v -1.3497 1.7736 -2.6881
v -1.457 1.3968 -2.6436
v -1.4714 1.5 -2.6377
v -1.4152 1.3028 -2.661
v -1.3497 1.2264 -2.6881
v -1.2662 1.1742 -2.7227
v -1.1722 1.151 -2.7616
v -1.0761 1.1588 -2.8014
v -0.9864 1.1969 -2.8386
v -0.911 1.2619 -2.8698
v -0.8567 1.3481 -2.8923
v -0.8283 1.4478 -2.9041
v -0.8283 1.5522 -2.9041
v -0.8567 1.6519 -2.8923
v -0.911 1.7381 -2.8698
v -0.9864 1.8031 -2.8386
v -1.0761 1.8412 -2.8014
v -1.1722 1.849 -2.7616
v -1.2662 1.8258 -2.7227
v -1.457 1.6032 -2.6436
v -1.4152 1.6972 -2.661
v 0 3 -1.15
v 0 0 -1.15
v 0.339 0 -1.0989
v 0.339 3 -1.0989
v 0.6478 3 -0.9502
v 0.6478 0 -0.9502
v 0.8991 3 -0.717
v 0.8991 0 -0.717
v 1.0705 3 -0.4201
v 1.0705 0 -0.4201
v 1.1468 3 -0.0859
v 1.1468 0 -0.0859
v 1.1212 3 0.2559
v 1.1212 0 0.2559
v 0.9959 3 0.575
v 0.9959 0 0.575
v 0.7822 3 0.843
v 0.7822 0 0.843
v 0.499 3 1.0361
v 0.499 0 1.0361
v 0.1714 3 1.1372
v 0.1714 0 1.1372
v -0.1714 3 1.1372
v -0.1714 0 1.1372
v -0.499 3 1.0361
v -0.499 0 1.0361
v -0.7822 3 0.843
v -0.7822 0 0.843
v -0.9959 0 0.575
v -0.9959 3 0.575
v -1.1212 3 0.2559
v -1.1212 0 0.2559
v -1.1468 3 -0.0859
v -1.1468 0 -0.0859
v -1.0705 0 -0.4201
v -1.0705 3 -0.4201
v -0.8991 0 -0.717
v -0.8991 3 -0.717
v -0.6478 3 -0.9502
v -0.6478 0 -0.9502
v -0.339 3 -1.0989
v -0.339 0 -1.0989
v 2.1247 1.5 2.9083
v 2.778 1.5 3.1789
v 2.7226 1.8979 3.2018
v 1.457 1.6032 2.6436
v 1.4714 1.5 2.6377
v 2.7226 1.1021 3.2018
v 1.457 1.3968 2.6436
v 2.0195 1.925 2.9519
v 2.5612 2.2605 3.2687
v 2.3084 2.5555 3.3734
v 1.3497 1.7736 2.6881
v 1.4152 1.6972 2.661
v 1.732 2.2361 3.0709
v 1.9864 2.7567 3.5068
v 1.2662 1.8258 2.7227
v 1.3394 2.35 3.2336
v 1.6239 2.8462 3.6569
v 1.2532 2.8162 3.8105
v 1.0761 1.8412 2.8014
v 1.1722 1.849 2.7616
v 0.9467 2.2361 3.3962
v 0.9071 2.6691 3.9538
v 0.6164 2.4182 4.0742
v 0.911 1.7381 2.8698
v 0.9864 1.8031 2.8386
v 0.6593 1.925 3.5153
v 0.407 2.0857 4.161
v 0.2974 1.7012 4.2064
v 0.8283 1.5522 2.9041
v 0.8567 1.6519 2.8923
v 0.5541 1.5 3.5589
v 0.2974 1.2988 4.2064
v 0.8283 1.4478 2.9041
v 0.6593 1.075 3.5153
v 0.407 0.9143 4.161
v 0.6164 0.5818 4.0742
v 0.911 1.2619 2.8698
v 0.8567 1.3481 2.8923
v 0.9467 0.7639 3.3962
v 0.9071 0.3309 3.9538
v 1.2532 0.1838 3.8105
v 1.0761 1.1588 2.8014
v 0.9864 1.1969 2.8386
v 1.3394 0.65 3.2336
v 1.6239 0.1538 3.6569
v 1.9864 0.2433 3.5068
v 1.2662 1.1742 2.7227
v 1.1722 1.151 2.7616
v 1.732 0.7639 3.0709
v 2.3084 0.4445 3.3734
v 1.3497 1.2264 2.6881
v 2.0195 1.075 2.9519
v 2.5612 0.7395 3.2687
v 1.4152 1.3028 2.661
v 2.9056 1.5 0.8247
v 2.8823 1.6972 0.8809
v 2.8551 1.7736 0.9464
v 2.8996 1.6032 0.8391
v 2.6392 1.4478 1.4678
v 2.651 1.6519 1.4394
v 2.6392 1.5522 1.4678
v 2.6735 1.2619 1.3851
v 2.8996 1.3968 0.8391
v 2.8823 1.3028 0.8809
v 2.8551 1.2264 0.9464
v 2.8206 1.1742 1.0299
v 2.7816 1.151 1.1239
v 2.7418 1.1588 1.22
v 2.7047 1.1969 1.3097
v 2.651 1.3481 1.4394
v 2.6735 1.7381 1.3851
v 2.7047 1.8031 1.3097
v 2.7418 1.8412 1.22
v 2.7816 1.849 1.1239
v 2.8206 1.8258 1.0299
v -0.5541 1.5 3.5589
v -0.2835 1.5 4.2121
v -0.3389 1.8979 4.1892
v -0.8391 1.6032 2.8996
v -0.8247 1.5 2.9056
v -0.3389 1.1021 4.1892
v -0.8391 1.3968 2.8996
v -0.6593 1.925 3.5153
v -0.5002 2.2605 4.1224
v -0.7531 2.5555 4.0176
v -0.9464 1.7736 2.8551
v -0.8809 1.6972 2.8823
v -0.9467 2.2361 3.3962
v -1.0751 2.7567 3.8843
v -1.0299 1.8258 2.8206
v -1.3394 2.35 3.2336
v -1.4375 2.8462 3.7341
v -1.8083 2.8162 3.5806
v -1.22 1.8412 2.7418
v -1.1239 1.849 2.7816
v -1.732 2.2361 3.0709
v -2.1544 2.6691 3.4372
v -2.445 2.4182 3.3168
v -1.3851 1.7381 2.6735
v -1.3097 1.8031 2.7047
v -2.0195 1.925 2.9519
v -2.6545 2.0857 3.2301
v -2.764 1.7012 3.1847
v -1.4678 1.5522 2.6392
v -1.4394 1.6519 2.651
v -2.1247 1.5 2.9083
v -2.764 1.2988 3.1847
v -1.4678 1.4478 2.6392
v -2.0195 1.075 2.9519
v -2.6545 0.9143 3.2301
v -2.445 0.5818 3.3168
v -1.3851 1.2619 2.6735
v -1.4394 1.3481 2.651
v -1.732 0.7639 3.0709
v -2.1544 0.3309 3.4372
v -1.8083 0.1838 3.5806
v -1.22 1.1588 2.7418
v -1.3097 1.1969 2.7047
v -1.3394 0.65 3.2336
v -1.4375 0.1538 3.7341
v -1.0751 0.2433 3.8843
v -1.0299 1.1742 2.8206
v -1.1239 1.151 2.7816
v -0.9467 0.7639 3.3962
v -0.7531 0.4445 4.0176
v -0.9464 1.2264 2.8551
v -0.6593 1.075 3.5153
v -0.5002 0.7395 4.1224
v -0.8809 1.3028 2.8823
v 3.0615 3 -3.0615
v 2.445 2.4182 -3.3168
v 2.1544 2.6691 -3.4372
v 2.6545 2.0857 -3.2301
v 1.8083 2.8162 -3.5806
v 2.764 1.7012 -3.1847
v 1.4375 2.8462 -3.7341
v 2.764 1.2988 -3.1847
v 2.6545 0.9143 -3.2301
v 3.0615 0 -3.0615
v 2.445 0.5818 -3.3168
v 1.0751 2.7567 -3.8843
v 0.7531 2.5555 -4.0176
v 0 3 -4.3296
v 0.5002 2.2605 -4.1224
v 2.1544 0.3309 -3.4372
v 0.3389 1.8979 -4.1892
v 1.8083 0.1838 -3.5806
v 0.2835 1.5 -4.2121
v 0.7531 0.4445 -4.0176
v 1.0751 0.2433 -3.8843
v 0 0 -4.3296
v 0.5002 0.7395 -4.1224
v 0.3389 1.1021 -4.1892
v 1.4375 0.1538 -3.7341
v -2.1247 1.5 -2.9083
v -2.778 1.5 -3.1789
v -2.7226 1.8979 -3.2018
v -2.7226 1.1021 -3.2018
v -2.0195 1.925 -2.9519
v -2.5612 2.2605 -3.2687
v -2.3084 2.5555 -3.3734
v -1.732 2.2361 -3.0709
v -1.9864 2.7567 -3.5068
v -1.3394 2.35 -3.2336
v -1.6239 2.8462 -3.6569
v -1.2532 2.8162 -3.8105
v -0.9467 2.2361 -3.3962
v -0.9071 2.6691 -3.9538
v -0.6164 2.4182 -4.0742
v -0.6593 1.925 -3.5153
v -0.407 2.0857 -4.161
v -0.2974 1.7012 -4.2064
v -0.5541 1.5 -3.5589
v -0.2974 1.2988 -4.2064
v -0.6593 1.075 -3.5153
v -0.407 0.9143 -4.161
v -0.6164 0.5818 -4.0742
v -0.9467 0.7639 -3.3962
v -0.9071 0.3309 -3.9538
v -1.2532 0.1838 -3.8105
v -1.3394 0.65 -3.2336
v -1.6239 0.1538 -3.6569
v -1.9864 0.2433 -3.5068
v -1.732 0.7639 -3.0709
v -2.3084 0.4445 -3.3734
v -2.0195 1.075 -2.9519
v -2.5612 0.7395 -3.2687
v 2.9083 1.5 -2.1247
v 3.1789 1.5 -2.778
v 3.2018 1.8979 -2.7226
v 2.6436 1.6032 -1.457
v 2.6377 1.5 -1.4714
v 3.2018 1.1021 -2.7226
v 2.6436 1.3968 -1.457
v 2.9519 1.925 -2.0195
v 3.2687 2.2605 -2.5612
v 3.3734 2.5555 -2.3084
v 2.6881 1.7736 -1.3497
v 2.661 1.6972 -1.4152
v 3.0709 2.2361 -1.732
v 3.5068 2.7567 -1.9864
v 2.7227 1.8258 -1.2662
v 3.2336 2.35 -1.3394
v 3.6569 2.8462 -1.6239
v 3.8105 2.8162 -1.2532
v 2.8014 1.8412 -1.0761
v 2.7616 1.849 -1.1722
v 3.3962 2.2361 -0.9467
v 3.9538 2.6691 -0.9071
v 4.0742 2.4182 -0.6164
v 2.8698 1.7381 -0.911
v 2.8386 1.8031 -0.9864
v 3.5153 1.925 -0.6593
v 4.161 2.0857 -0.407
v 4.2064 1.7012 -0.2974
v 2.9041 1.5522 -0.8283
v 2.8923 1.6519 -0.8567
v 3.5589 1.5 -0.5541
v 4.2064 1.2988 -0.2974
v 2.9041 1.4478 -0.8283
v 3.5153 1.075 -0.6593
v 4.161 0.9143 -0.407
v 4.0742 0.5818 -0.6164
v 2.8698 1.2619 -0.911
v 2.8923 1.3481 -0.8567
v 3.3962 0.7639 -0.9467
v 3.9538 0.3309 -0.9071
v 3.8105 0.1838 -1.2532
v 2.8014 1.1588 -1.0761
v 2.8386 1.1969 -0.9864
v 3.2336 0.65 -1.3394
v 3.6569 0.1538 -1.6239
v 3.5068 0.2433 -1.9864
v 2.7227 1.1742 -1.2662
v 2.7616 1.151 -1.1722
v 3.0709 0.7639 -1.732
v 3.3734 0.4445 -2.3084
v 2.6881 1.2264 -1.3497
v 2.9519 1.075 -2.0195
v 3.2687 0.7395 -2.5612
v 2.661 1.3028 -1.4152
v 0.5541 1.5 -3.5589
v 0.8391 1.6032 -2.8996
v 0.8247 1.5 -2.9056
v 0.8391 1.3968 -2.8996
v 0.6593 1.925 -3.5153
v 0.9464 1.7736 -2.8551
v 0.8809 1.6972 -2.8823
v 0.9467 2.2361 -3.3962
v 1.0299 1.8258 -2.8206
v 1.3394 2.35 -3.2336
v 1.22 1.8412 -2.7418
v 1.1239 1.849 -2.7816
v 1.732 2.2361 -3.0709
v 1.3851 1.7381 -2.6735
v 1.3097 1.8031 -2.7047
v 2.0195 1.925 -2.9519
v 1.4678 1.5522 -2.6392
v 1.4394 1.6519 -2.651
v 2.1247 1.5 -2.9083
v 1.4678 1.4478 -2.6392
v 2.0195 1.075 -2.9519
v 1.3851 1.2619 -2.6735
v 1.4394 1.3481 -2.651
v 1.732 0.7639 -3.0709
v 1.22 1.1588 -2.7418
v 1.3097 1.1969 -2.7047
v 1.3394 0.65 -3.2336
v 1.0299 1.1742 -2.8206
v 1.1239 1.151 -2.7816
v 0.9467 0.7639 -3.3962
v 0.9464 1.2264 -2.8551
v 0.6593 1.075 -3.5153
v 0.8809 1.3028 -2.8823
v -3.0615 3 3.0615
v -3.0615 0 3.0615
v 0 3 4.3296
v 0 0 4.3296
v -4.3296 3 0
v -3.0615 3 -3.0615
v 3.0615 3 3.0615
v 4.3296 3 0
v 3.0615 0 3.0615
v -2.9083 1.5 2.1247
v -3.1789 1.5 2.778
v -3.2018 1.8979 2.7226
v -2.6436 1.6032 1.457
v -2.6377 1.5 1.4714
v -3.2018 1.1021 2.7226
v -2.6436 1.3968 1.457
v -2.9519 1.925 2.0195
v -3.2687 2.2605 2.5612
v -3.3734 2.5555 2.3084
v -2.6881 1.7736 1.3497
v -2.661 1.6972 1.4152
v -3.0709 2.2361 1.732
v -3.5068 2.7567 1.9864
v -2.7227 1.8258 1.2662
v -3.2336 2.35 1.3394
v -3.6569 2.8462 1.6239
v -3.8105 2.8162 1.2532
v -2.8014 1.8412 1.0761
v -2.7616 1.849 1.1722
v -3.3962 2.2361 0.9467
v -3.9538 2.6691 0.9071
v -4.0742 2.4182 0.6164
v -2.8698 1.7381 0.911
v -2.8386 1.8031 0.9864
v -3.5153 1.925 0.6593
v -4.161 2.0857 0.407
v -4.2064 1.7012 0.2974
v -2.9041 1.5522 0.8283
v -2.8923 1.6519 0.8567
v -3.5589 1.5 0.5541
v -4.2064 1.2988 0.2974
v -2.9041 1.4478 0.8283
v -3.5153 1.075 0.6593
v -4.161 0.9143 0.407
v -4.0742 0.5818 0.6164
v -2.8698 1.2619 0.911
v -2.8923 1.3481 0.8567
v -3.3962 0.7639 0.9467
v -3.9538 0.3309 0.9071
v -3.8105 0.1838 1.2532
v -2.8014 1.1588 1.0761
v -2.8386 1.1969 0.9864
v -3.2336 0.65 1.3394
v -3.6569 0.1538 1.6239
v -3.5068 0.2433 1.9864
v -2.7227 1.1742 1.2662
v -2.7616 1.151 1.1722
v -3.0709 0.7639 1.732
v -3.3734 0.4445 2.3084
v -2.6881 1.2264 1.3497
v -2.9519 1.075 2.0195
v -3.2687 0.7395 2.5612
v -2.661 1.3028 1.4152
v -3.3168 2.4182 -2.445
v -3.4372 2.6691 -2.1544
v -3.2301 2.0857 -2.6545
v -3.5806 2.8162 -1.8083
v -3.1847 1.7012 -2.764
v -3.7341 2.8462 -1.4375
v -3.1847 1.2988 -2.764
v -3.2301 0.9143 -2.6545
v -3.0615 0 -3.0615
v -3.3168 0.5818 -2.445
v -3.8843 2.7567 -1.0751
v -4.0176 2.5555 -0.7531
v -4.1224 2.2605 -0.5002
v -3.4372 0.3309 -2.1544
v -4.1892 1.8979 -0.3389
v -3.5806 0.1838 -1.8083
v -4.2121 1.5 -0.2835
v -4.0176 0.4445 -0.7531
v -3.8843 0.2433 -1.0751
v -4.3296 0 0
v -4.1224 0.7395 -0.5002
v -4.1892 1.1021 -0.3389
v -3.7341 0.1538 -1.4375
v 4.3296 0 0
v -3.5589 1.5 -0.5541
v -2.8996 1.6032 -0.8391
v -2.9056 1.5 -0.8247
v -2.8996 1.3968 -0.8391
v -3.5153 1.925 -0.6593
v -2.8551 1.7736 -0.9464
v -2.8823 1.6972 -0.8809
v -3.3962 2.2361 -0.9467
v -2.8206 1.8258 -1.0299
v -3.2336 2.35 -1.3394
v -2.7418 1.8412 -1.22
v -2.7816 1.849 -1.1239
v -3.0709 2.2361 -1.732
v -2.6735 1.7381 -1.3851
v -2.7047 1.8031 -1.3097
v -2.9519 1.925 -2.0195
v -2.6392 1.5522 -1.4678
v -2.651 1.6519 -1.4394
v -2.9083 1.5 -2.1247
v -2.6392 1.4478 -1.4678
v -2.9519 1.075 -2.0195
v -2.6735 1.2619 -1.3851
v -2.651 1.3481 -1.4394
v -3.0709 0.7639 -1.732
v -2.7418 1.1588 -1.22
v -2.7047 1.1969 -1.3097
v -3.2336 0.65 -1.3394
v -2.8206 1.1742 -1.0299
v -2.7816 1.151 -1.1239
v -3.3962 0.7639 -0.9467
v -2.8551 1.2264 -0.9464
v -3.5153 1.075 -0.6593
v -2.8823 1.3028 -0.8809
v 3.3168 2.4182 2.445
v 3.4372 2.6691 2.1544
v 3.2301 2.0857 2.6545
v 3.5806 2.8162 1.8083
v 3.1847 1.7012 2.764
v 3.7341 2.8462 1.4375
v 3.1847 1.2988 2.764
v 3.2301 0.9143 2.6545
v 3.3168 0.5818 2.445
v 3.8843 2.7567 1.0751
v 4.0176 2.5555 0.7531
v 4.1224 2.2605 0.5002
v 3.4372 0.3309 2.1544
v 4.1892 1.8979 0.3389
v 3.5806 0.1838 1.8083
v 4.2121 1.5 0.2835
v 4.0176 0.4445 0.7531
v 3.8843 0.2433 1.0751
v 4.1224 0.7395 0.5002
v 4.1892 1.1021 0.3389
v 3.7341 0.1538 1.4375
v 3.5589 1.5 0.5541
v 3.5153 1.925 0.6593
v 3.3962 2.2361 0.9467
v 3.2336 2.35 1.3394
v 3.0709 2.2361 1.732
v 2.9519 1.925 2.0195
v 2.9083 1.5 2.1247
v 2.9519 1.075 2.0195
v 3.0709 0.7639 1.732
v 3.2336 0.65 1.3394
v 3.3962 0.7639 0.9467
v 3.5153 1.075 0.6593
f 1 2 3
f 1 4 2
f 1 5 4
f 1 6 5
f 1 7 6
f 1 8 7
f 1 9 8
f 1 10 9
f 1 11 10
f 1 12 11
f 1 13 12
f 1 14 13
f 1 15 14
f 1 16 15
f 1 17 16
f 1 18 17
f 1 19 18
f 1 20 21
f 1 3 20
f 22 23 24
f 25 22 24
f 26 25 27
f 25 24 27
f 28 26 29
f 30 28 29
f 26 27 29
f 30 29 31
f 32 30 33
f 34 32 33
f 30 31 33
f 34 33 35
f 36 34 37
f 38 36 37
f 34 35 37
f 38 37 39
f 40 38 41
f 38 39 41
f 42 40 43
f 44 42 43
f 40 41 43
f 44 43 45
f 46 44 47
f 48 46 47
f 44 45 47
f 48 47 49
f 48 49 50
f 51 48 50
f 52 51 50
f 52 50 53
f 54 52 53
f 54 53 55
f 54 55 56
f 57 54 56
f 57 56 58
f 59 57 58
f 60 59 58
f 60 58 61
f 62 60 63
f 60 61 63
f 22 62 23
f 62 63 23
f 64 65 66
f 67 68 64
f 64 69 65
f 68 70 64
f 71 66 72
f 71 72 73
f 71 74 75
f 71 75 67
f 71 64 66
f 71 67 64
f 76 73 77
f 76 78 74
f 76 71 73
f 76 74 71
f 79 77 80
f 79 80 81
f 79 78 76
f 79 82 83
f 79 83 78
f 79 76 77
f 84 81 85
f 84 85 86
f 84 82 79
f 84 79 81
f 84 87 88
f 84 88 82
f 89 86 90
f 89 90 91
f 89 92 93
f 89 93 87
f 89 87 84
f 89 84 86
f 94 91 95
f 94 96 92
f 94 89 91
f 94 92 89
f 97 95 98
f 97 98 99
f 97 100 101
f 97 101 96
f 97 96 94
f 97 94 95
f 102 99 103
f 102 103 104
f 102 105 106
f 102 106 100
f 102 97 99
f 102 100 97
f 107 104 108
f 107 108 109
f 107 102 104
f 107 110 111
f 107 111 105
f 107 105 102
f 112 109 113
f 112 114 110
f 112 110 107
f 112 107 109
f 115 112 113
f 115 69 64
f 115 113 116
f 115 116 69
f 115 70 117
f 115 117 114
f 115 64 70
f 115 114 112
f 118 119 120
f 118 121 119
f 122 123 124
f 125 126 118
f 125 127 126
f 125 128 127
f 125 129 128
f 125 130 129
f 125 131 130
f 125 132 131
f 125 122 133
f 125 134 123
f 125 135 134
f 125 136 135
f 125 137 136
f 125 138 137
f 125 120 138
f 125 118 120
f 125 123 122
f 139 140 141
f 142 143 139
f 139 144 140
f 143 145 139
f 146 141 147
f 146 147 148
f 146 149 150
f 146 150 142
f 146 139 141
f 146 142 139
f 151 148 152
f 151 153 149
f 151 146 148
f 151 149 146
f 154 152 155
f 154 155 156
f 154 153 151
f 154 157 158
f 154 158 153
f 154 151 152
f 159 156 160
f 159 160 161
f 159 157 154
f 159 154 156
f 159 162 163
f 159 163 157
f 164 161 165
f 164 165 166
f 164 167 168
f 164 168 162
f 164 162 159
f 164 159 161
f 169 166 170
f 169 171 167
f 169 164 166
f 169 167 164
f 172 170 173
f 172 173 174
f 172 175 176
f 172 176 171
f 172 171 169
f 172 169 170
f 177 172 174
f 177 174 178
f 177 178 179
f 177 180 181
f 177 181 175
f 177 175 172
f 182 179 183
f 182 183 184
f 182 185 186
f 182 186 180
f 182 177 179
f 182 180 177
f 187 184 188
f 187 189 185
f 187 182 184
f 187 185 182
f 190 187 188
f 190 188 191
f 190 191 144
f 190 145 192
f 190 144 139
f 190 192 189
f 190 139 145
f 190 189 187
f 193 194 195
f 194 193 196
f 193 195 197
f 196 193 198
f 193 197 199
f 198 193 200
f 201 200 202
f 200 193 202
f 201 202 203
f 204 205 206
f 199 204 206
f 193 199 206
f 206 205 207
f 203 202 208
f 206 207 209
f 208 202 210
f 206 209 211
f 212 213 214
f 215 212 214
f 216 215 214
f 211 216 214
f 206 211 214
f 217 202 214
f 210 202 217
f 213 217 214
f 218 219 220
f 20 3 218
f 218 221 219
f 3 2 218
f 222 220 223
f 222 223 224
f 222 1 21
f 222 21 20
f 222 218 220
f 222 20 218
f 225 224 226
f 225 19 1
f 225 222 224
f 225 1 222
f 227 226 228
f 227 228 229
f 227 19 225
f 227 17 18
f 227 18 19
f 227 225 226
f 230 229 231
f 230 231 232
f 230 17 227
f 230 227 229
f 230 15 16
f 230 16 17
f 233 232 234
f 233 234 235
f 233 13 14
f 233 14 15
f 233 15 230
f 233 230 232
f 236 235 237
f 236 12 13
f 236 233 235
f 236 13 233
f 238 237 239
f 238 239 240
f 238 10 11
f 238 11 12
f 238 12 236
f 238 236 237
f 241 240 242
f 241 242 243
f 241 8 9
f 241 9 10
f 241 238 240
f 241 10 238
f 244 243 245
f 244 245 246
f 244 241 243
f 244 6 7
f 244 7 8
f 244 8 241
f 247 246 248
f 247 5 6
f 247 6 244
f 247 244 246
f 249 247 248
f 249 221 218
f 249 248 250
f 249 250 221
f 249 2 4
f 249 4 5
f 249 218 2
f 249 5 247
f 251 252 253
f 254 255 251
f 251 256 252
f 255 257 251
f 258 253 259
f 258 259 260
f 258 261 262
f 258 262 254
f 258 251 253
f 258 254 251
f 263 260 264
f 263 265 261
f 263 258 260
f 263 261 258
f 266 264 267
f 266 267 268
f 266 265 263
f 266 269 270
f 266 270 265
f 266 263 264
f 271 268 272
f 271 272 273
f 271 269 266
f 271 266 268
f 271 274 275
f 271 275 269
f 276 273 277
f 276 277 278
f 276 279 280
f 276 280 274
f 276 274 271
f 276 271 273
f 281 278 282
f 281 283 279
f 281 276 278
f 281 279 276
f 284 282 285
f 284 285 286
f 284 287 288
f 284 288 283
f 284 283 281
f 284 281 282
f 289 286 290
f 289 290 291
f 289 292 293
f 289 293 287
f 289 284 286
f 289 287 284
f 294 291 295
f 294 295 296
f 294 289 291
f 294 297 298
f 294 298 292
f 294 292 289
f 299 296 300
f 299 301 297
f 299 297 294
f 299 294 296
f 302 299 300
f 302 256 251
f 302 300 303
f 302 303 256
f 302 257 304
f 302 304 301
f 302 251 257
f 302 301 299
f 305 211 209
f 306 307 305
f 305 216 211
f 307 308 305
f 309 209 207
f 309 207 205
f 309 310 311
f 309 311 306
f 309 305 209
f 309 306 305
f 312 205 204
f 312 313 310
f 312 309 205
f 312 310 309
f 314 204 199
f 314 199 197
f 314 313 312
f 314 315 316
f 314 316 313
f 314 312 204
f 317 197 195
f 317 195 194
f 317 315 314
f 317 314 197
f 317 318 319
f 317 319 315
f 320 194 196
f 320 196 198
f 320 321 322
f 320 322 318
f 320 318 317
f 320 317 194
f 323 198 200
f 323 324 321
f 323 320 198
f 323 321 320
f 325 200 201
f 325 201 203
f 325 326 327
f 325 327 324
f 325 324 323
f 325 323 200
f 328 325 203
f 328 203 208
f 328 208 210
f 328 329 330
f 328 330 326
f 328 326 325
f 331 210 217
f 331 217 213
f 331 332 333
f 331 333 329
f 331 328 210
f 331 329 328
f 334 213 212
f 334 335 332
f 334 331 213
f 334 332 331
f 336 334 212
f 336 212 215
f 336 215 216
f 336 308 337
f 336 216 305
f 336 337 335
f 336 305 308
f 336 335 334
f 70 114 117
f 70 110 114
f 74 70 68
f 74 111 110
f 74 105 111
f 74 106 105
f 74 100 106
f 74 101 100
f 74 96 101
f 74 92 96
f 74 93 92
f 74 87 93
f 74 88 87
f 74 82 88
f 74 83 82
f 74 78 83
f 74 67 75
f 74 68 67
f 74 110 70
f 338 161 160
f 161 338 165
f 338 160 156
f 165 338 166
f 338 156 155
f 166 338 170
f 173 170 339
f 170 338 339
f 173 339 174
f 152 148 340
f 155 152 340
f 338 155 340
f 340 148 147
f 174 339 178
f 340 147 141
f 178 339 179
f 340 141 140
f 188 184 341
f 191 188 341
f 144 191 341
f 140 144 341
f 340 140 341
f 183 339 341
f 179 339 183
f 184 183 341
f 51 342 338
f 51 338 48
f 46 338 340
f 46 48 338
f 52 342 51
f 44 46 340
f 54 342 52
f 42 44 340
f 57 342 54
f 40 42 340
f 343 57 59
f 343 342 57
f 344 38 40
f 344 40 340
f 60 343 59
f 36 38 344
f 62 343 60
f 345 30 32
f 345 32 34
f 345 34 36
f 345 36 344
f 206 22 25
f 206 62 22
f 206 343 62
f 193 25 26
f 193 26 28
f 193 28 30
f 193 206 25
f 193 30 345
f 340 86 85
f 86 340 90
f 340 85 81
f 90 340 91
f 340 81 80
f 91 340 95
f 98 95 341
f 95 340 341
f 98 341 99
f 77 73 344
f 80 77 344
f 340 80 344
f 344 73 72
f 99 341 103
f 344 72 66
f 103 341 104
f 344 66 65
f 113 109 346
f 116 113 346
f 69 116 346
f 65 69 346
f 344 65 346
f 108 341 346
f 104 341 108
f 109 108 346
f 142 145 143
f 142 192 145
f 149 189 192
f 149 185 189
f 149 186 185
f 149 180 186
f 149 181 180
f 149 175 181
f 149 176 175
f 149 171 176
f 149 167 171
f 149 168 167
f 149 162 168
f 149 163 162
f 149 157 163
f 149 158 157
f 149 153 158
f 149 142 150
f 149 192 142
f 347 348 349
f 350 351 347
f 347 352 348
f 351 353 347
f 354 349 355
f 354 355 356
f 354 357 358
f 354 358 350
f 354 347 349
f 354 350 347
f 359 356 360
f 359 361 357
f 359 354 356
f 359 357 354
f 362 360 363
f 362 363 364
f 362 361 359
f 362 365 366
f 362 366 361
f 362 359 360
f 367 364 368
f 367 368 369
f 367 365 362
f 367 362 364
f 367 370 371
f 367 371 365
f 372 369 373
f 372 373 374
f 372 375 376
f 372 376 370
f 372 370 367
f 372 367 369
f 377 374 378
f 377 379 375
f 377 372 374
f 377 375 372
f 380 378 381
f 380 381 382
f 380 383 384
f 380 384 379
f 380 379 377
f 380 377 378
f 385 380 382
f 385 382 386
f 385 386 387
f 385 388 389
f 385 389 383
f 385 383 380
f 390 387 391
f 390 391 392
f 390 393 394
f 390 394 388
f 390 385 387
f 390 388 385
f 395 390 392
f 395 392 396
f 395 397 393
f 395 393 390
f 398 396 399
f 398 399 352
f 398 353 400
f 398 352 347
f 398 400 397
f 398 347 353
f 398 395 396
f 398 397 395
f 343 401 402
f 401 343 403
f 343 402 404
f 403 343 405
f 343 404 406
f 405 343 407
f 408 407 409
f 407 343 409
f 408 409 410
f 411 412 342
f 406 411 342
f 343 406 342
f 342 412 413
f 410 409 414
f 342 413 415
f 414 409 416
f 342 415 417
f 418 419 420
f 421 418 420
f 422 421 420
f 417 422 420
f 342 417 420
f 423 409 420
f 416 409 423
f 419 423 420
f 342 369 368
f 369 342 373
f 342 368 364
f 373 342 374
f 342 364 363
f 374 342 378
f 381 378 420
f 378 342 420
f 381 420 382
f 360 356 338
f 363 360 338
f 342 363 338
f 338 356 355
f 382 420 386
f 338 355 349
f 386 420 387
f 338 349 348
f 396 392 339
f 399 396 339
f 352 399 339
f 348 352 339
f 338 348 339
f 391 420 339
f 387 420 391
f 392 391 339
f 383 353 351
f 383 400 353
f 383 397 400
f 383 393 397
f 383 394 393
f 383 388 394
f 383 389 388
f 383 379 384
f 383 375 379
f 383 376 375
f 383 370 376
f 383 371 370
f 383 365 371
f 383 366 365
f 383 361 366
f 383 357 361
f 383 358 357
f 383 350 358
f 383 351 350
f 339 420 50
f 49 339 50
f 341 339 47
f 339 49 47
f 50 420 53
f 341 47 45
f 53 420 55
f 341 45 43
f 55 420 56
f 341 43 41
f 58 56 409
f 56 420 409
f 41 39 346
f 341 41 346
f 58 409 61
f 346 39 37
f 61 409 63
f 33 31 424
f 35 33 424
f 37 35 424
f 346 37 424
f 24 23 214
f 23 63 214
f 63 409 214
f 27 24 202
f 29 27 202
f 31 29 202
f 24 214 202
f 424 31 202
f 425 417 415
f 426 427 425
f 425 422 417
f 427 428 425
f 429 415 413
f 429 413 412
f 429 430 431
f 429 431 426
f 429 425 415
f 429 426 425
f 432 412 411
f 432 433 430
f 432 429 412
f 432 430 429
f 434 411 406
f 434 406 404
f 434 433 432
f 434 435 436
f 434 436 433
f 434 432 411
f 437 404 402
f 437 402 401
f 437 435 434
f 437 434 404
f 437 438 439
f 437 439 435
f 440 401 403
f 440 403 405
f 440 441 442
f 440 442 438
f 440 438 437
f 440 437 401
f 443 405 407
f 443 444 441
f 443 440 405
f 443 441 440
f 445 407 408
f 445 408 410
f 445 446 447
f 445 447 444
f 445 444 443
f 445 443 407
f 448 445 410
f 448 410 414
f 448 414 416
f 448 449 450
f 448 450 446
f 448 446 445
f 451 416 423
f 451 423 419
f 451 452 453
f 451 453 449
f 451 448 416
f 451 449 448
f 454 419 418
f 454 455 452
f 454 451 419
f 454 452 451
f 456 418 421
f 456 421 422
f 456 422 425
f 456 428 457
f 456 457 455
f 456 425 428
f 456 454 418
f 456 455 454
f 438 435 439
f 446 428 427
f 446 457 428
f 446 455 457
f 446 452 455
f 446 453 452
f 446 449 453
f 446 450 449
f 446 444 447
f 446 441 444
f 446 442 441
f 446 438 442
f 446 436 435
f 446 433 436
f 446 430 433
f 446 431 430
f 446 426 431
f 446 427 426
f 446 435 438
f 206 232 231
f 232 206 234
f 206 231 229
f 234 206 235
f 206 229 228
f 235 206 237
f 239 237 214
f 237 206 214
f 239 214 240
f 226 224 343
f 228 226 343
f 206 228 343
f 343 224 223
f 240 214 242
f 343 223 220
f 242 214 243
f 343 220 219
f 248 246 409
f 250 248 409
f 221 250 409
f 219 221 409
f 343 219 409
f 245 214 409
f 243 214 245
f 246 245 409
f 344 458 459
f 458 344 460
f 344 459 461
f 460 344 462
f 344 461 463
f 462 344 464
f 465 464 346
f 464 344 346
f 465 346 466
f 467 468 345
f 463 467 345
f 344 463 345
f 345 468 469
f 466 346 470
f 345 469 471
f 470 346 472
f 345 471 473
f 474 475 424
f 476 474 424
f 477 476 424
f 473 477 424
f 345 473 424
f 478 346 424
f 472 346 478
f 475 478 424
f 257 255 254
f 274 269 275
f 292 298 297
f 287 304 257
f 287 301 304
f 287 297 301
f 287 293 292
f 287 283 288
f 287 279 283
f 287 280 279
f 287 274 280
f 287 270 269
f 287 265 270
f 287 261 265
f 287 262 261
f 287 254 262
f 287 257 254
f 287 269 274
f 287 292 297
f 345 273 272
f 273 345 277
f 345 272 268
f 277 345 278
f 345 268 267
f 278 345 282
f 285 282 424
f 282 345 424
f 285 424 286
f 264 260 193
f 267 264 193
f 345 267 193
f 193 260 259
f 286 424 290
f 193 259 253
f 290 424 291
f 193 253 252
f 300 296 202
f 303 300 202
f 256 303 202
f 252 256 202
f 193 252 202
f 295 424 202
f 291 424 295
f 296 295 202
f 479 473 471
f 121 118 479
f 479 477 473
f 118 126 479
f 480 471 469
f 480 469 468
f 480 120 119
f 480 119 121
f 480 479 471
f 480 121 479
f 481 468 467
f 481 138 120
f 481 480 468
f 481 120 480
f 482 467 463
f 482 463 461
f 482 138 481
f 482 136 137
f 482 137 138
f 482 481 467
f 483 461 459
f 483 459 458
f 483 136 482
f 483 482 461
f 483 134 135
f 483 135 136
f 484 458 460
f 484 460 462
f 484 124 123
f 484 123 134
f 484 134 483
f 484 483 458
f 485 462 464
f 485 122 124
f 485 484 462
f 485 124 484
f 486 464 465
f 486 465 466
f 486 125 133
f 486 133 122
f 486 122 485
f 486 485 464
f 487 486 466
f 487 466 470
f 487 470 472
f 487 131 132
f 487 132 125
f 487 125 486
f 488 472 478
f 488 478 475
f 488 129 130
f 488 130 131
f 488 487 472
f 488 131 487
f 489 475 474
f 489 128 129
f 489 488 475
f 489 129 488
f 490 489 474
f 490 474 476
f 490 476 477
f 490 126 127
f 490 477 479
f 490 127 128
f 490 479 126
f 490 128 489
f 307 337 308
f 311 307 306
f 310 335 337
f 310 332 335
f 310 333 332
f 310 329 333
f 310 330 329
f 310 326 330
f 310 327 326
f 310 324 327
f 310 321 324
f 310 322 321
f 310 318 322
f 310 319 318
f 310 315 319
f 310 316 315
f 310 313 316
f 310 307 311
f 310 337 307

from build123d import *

# Parameters (mm, degrees)
BOSS_EXTRUDE1_DEPTH = 3
SKETCH2_R           = 1.15
CUT_EXTRUDE1_DEPTH  = 3
SKETCH3_R           = 0.15
CUT_EXTRUDE2_DEPTH  = 1
CHAMFER1_SIZE       = 1.2
CIRPATTERN3_COUNT   = 8
CHAMFER2_SIZE       = 1.2


with BuildPart() as part:
    # Sketch1 → Boss-Extrude1 (new body)
    with BuildSketch(Plane(origin=(0, 0, 0), x_dir=(1, 0, 0), z_dir=(0, 1, 0))):
        Polygon((4.329568801, 0), (3.061467459, 3.061467459), (0, 4.329568801), (-3.061467459, 3.061467459), (-4.329568801, 0), (-3.061467459, -3.061467459), (0, -4.329568801), (3.061467459, -3.061467459), align=None)
    extrude(amount=BOSS_EXTRUDE1_DEPTH)

    # Sketch2 → Cut-Extrude1 (cut)
    with BuildSketch(Plane.XZ):
        with Locations(Location((0, 0, 0), (0, 0, 270))):
            Circle(SKETCH2_R)
    extrude(amount=-CUT_EXTRUDE1_DEPTH, mode=Mode.SUBTRACT)

    # Sketch3 → Cut-Extrude2 (cut)
    with BuildSketch(Plane(origin=(-1.530733729, 0, 3.69551813), x_dir=(0.9238795325112894, 0, 0.3826834323650832), z_dir=(-0.3826834323650833, 0, 0.9238795325112895))):
        with Locations((0, 1.5)):
            Circle(SKETCH3_R)
    cut_extrude2 = extrude(amount=-CUT_EXTRUDE2_DEPTH, mode=Mode.SUBTRACT)

    # Chamfer1
    # the kernel refuses this chamfer: 1.2 mm, written as the material it takes off along each edge
    with BuildSketch(Plane(origin=(-1.530733729, 1.5, 3.69551813), x_dir=(0.9238795325112892, 0, 0.382683432365084), z_dir=(0, -1, 0))) as chamfer1_piece_1_section:
        Polygon((0.15 + CHAMFER1_SIZE, 0), (0.15, -CHAMFER1_SIZE), (0.15, 0), align=None)
    chamfer1_piece_1 = revolve(axis=Axis((-1.530733729, 1.5, 3.69551813), (-0.3826834323650833, 0, 0.9238795325112895)), mode=Mode.PRIVATE)
    chamfer1_piece_1 = split(chamfer1_piece_1, bisect_by=Plane(origin=(-1.939951072, 1.5, 2.443622557), z_dir=(-0.3826834323650833, 0, 0.9238795325112895)), keep=Keep.TOP, mode=Mode.PRIVATE)
    add(chamfer1_piece_1, mode=Mode.SUBTRACT)

    # CirPattern3: Cut-Extrude2 ×8 about axis
    cirpattern3_axis = Axis((0, 0, 0), (0, 1, 0))
    for i in range(1, CIRPATTERN3_COUNT):
        add(cut_extrude2.rotate(cirpattern3_axis, i * 360 / CIRPATTERN3_COUNT), mode=Mode.SUBTRACT)

    # Chamfer2
    # the kernel refuses this chamfer: 1.2 mm, written as the material it takes off along each edge
    with BuildSketch(Plane(origin=(1.530733729, 1.5, 3.69551813), x_dir=(0.9238795325112833, 0, -0.3826834323650982), z_dir=(0, -1, 0))) as chamfer2_piece_1_section:
        Polygon((0.15 + CHAMFER2_SIZE, 0), (0.15, -CHAMFER2_SIZE), (0.15, 0), align=None)
    chamfer2_piece_1 = revolve(axis=Axis((1.530733729, 1.5, 3.69551813), (0.3826834323650963, 0, 0.9238795325112842)), mode=Mode.PRIVATE)
    chamfer2_piece_1 = split(chamfer2_piece_1, bisect_by=Plane(origin=(0.356149522, 1.5, 3.099654638), z_dir=(0.3826834323650963, 0, 0.9238795325112842)), keep=Keep.TOP, mode=Mode.PRIVATE)
    add(chamfer2_piece_1, mode=Mode.SUBTRACT)
    with BuildSketch(Plane(origin=(3.69551813, 1.5, 1.530733729), x_dir=(0.382683432365084, 0, -0.9238795325112892), z_dir=(0, -1, 0))) as chamfer2_piece_2_section:
        Polygon((0.15 + CHAMFER2_SIZE, 0), (0.15, -CHAMFER2_SIZE), (0.15, 0), align=None)
    chamfer2_piece_2 = revolve(axis=Axis((3.69551813, 1.5, 1.530733729), (0.9238795325112895, 0, 0.3826834323650834)), mode=Mode.PRIVATE)
    chamfer2_piece_2 = split(chamfer2_piece_2, bisect_by=Plane(origin=(2.443622557, 1.5, 1.939951072), z_dir=(0.9238795325112895, 0, 0.3826834323650834)), keep=Keep.TOP, mode=Mode.PRIVATE)
    add(chamfer2_piece_2, mode=Mode.SUBTRACT)
    with BuildSketch(Plane(origin=(-3.69551813, 1.5, 1.530733729), x_dir=(0.3826834323650982, 0, 0.9238795325112833), z_dir=(0, -1, 0))) as chamfer2_piece_3_section:
        Polygon((0.15 + CHAMFER2_SIZE, 0), (0.15, -CHAMFER2_SIZE), (0.15, 0), align=None)
    chamfer2_piece_3 = revolve(axis=Axis((-3.69551813, 1.5, 1.530733729), (-0.9238795325112843, 0, 0.3826834323650961)), mode=Mode.PRIVATE)
    chamfer2_piece_3 = split(chamfer2_piece_3, bisect_by=Plane(origin=(-3.099654638, 1.5, 0.356149522), z_dir=(-0.9238795325112843, 0, 0.3826834323650961)), keep=Keep.TOP, mode=Mode.PRIVATE)
    add(chamfer2_piece_3, mode=Mode.SUBTRACT)
    with BuildSketch(Plane(origin=(-3.69551813, 1.5, -1.530733729), x_dir=(-0.382683432365084, 0, 0.9238795325112892), z_dir=(0, -1, 0))) as chamfer2_piece_4_section:
        Polygon((0.15 + CHAMFER2_SIZE, 0), (0.15, -CHAMFER2_SIZE), (0.15, 0), align=None)
    chamfer2_piece_4 = revolve(axis=Axis((-3.69551813, 1.5, -1.530733729), (-0.9238795325112894, 0, -0.3826834323650835)), mode=Mode.PRIVATE)
    chamfer2_piece_4 = split(chamfer2_piece_4, bisect_by=Plane(origin=(-2.443622557, 1.5, -1.939951072), z_dir=(-0.9238795325112894, 0, -0.3826834323650835)), keep=Keep.TOP, mode=Mode.PRIVATE)
    add(chamfer2_piece_4, mode=Mode.SUBTRACT)
    with BuildSketch(Plane(origin=(-1.530733729, 1.5, -3.69551813), x_dir=(-0.9238795325112833, 0, 0.3826834323650982), z_dir=(0, -1, 0))) as chamfer2_piece_5_section:
        Polygon((0.15 + CHAMFER2_SIZE, 0), (0.15, -CHAMFER2_SIZE), (0.15, 0), align=None)
    chamfer2_piece_5 = revolve(axis=Axis((-1.530733729, 1.5, -3.69551813), (-0.3826834323650961, 0, -0.9238795325112841)), mode=Mode.PRIVATE)
    chamfer2_piece_5 = split(chamfer2_piece_5, bisect_by=Plane(origin=(-0.356149522, 1.5, -3.099654638), z_dir=(-0.3826834323650962, 0, -0.9238795325112843)), keep=Keep.TOP, mode=Mode.PRIVATE)
    add(chamfer2_piece_5, mode=Mode.SUBTRACT)
    with BuildSketch(Plane(origin=(1.530733729, 1.5, -3.69551813), x_dir=(-0.9238795325112892, 0, -0.382683432365084), z_dir=(0, -1, 0))) as chamfer2_piece_6_section:
        Polygon((0.15 + CHAMFER2_SIZE, 0), (0.15, -CHAMFER2_SIZE), (0.15, 0), align=None)
    chamfer2_piece_6 = revolve(axis=Axis((1.530733729, 1.5, -3.69551813), (0.3826834323650834, 0, -0.9238795325112895)), mode=Mode.PRIVATE)
    chamfer2_piece_6 = split(chamfer2_piece_6, bisect_by=Plane(origin=(1.939951072, 1.5, -2.443622557), z_dir=(0.3826834323650834, 0, -0.9238795325112895)), keep=Keep.TOP, mode=Mode.PRIVATE)
    add(chamfer2_piece_6, mode=Mode.SUBTRACT)
    with BuildSketch(Plane(origin=(3.69551813, 1.5, -1.530733729), x_dir=(-0.3826834323650982, 0, -0.9238795325112833), z_dir=(0, -1, 0))) as chamfer2_piece_7_section:
        Polygon((0.15 + CHAMFER2_SIZE, 0), (0.15, -CHAMFER2_SIZE), (0.15, 0), align=None)
    chamfer2_piece_7 = revolve(axis=Axis((3.69551813, 1.5, -1.530733729), (0.9238795325112842, 0, -0.3826834323650963)), mode=Mode.PRIVATE)
    chamfer2_piece_7 = split(chamfer2_piece_7, bisect_by=Plane(origin=(3.099654638, 1.5, -0.356149522), z_dir=(0.9238795325112842, 0, -0.3826834323650963)), keep=Keep.TOP, mode=Mode.PRIVATE)
    add(chamfer2_piece_7, mode=Mode.SUBTRACT)


solid = part.part
